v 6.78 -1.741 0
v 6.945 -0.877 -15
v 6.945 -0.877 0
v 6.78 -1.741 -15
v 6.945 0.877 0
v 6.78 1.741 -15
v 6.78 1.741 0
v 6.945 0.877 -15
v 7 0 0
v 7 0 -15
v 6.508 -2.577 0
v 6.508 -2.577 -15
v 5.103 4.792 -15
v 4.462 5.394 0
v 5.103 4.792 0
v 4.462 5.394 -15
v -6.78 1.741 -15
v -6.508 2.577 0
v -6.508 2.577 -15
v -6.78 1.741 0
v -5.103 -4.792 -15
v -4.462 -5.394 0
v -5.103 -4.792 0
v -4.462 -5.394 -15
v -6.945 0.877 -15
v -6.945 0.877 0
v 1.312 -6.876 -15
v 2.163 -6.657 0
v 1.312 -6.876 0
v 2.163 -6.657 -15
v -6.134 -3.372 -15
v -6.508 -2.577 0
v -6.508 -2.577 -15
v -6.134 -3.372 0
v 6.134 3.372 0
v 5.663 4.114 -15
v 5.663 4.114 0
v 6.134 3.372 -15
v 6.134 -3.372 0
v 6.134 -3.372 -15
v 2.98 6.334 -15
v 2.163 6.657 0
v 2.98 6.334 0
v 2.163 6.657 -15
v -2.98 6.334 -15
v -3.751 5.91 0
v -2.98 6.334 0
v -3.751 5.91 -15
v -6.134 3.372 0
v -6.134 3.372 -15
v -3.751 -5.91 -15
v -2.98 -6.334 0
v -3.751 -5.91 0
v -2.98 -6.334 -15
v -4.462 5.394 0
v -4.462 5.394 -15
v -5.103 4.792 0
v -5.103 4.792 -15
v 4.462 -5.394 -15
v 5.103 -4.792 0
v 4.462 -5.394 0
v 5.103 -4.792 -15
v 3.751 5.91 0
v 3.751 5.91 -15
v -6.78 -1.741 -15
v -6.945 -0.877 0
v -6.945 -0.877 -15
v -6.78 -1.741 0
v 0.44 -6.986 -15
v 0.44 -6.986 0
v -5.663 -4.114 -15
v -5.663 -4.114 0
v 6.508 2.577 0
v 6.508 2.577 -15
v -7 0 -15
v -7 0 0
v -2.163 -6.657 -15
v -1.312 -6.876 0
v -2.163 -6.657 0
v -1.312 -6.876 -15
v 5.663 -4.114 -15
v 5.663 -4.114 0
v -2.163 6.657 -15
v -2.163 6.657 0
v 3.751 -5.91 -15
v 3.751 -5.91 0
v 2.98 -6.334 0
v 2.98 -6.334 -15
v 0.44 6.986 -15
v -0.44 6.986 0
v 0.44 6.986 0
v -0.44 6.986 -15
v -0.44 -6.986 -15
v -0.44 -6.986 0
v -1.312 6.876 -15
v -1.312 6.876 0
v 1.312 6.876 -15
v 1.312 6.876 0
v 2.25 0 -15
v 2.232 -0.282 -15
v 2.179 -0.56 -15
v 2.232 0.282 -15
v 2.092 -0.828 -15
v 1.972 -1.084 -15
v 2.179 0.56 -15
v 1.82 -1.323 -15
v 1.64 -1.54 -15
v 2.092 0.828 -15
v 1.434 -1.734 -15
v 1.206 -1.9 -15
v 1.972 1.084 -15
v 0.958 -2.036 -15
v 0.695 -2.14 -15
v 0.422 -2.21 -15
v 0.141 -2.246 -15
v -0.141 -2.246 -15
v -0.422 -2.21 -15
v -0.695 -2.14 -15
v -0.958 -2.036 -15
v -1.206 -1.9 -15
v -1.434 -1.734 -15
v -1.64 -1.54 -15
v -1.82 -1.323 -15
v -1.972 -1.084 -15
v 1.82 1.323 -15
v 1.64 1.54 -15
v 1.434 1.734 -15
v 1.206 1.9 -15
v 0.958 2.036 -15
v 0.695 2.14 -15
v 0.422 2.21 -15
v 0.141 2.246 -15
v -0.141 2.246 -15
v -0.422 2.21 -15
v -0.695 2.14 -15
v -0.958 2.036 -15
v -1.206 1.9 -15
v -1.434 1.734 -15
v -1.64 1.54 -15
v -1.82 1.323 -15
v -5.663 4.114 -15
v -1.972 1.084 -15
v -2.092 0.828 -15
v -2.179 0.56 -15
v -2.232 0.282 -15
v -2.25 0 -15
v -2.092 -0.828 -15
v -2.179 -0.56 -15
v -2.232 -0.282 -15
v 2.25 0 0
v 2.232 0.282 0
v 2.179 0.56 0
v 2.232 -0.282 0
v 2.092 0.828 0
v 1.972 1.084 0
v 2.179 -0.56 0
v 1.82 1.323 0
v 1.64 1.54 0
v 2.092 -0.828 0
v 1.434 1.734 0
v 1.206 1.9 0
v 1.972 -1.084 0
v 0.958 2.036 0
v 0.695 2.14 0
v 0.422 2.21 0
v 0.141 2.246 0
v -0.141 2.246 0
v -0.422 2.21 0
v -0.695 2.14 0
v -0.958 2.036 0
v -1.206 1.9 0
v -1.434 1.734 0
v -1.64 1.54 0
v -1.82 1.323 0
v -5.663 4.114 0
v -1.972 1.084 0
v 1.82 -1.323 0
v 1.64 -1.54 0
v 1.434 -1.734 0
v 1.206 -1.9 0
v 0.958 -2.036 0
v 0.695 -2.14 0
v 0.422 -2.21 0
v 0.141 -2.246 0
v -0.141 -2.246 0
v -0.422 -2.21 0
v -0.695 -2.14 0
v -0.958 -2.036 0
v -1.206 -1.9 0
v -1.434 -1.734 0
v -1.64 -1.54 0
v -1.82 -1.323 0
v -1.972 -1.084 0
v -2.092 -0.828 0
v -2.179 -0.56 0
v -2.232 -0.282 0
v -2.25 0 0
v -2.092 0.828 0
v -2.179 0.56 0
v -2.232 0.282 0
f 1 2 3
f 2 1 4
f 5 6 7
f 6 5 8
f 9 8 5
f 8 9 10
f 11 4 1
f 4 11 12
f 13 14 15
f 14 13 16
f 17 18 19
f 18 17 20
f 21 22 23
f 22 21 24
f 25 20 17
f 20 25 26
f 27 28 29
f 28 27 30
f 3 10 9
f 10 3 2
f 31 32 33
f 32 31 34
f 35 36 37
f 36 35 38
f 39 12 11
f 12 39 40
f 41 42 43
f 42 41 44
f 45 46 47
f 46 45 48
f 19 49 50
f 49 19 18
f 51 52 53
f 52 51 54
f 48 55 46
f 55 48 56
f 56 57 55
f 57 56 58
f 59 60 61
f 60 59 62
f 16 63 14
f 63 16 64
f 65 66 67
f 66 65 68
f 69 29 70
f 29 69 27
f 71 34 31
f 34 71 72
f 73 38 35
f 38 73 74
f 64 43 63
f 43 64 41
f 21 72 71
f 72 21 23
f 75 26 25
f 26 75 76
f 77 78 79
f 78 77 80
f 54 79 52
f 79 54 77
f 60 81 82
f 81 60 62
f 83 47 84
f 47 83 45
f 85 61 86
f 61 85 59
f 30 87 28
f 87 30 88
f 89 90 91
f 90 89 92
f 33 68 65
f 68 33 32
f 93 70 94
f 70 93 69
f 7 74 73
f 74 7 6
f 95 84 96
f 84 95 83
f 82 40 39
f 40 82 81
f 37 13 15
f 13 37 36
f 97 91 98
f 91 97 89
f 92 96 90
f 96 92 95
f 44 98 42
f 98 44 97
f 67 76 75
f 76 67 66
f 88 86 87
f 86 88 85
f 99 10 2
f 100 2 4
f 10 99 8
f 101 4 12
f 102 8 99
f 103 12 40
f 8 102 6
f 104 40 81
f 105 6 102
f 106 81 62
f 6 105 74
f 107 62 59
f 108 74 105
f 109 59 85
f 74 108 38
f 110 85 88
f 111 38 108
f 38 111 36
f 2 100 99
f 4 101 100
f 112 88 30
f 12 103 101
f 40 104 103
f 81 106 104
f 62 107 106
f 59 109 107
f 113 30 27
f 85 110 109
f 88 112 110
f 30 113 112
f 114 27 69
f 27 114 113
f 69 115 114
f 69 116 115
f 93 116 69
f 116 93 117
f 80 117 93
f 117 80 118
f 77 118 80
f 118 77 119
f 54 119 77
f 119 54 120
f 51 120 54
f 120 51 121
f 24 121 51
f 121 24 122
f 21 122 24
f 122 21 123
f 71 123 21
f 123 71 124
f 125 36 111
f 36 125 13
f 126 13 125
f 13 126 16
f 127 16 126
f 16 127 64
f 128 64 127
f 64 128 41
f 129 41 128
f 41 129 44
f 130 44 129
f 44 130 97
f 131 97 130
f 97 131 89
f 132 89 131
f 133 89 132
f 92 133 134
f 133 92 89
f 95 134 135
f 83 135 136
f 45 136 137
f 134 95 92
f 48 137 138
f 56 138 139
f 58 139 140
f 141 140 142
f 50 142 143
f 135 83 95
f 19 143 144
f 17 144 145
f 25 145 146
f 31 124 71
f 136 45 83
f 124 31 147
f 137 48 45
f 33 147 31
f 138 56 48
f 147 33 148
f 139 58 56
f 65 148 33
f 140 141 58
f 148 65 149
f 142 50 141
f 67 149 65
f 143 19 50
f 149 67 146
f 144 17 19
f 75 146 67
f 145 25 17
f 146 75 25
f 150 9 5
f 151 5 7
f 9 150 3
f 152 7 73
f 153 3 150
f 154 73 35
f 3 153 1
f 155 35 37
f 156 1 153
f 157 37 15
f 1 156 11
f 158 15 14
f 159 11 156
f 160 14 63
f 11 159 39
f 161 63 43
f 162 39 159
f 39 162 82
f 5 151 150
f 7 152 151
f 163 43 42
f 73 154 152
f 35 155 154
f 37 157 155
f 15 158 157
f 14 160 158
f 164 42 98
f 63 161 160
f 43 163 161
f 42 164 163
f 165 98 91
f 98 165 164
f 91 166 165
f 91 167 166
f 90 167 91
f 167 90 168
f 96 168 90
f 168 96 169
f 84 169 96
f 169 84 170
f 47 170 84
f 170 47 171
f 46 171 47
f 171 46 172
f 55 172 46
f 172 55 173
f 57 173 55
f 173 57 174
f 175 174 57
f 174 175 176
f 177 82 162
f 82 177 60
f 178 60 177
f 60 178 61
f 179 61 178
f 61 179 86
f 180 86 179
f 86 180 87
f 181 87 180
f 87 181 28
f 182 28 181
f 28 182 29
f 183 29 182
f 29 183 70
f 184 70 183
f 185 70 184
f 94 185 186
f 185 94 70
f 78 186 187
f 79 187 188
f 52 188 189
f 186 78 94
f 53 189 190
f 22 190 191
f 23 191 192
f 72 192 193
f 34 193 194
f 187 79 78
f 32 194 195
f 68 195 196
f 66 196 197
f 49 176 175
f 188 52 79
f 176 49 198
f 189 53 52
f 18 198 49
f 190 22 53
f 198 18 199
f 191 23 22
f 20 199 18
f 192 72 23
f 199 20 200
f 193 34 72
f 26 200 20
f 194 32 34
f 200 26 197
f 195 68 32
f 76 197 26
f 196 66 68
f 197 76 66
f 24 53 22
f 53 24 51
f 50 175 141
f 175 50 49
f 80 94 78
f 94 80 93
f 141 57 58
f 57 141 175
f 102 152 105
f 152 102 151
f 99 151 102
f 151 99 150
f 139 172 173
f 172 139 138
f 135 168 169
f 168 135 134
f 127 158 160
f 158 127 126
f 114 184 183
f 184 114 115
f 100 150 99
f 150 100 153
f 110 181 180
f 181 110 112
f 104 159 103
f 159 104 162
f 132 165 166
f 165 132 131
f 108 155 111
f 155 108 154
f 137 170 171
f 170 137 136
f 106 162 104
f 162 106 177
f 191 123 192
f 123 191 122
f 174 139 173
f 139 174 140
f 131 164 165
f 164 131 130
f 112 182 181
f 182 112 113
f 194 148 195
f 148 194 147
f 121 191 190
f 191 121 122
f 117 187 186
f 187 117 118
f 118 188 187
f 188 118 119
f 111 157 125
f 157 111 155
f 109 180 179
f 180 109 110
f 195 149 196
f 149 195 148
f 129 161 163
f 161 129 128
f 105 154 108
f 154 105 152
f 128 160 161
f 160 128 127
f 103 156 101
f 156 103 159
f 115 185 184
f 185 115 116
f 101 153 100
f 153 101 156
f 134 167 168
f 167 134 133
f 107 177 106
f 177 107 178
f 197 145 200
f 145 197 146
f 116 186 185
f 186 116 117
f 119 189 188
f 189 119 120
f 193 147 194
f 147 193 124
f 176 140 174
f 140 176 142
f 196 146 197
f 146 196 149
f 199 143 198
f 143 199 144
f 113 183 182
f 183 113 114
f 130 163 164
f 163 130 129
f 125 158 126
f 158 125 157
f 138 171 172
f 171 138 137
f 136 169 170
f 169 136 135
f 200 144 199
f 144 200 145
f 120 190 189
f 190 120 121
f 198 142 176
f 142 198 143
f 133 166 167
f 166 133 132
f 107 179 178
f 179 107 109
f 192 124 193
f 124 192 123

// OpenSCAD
$fn = 50;


difference() {
	union() {
		translate(v = [0, 0, -15.0000000000]) {
			cylinder(h = 15, r = 7.0000000000);
		}
		cylinder(h = 0, r = 13.0000000000);
	}
	union() {
		#translate(v = [0, 0, -15]) {
			cylinder(h = 15, r = 2.2500000000);
		}
	}
}
